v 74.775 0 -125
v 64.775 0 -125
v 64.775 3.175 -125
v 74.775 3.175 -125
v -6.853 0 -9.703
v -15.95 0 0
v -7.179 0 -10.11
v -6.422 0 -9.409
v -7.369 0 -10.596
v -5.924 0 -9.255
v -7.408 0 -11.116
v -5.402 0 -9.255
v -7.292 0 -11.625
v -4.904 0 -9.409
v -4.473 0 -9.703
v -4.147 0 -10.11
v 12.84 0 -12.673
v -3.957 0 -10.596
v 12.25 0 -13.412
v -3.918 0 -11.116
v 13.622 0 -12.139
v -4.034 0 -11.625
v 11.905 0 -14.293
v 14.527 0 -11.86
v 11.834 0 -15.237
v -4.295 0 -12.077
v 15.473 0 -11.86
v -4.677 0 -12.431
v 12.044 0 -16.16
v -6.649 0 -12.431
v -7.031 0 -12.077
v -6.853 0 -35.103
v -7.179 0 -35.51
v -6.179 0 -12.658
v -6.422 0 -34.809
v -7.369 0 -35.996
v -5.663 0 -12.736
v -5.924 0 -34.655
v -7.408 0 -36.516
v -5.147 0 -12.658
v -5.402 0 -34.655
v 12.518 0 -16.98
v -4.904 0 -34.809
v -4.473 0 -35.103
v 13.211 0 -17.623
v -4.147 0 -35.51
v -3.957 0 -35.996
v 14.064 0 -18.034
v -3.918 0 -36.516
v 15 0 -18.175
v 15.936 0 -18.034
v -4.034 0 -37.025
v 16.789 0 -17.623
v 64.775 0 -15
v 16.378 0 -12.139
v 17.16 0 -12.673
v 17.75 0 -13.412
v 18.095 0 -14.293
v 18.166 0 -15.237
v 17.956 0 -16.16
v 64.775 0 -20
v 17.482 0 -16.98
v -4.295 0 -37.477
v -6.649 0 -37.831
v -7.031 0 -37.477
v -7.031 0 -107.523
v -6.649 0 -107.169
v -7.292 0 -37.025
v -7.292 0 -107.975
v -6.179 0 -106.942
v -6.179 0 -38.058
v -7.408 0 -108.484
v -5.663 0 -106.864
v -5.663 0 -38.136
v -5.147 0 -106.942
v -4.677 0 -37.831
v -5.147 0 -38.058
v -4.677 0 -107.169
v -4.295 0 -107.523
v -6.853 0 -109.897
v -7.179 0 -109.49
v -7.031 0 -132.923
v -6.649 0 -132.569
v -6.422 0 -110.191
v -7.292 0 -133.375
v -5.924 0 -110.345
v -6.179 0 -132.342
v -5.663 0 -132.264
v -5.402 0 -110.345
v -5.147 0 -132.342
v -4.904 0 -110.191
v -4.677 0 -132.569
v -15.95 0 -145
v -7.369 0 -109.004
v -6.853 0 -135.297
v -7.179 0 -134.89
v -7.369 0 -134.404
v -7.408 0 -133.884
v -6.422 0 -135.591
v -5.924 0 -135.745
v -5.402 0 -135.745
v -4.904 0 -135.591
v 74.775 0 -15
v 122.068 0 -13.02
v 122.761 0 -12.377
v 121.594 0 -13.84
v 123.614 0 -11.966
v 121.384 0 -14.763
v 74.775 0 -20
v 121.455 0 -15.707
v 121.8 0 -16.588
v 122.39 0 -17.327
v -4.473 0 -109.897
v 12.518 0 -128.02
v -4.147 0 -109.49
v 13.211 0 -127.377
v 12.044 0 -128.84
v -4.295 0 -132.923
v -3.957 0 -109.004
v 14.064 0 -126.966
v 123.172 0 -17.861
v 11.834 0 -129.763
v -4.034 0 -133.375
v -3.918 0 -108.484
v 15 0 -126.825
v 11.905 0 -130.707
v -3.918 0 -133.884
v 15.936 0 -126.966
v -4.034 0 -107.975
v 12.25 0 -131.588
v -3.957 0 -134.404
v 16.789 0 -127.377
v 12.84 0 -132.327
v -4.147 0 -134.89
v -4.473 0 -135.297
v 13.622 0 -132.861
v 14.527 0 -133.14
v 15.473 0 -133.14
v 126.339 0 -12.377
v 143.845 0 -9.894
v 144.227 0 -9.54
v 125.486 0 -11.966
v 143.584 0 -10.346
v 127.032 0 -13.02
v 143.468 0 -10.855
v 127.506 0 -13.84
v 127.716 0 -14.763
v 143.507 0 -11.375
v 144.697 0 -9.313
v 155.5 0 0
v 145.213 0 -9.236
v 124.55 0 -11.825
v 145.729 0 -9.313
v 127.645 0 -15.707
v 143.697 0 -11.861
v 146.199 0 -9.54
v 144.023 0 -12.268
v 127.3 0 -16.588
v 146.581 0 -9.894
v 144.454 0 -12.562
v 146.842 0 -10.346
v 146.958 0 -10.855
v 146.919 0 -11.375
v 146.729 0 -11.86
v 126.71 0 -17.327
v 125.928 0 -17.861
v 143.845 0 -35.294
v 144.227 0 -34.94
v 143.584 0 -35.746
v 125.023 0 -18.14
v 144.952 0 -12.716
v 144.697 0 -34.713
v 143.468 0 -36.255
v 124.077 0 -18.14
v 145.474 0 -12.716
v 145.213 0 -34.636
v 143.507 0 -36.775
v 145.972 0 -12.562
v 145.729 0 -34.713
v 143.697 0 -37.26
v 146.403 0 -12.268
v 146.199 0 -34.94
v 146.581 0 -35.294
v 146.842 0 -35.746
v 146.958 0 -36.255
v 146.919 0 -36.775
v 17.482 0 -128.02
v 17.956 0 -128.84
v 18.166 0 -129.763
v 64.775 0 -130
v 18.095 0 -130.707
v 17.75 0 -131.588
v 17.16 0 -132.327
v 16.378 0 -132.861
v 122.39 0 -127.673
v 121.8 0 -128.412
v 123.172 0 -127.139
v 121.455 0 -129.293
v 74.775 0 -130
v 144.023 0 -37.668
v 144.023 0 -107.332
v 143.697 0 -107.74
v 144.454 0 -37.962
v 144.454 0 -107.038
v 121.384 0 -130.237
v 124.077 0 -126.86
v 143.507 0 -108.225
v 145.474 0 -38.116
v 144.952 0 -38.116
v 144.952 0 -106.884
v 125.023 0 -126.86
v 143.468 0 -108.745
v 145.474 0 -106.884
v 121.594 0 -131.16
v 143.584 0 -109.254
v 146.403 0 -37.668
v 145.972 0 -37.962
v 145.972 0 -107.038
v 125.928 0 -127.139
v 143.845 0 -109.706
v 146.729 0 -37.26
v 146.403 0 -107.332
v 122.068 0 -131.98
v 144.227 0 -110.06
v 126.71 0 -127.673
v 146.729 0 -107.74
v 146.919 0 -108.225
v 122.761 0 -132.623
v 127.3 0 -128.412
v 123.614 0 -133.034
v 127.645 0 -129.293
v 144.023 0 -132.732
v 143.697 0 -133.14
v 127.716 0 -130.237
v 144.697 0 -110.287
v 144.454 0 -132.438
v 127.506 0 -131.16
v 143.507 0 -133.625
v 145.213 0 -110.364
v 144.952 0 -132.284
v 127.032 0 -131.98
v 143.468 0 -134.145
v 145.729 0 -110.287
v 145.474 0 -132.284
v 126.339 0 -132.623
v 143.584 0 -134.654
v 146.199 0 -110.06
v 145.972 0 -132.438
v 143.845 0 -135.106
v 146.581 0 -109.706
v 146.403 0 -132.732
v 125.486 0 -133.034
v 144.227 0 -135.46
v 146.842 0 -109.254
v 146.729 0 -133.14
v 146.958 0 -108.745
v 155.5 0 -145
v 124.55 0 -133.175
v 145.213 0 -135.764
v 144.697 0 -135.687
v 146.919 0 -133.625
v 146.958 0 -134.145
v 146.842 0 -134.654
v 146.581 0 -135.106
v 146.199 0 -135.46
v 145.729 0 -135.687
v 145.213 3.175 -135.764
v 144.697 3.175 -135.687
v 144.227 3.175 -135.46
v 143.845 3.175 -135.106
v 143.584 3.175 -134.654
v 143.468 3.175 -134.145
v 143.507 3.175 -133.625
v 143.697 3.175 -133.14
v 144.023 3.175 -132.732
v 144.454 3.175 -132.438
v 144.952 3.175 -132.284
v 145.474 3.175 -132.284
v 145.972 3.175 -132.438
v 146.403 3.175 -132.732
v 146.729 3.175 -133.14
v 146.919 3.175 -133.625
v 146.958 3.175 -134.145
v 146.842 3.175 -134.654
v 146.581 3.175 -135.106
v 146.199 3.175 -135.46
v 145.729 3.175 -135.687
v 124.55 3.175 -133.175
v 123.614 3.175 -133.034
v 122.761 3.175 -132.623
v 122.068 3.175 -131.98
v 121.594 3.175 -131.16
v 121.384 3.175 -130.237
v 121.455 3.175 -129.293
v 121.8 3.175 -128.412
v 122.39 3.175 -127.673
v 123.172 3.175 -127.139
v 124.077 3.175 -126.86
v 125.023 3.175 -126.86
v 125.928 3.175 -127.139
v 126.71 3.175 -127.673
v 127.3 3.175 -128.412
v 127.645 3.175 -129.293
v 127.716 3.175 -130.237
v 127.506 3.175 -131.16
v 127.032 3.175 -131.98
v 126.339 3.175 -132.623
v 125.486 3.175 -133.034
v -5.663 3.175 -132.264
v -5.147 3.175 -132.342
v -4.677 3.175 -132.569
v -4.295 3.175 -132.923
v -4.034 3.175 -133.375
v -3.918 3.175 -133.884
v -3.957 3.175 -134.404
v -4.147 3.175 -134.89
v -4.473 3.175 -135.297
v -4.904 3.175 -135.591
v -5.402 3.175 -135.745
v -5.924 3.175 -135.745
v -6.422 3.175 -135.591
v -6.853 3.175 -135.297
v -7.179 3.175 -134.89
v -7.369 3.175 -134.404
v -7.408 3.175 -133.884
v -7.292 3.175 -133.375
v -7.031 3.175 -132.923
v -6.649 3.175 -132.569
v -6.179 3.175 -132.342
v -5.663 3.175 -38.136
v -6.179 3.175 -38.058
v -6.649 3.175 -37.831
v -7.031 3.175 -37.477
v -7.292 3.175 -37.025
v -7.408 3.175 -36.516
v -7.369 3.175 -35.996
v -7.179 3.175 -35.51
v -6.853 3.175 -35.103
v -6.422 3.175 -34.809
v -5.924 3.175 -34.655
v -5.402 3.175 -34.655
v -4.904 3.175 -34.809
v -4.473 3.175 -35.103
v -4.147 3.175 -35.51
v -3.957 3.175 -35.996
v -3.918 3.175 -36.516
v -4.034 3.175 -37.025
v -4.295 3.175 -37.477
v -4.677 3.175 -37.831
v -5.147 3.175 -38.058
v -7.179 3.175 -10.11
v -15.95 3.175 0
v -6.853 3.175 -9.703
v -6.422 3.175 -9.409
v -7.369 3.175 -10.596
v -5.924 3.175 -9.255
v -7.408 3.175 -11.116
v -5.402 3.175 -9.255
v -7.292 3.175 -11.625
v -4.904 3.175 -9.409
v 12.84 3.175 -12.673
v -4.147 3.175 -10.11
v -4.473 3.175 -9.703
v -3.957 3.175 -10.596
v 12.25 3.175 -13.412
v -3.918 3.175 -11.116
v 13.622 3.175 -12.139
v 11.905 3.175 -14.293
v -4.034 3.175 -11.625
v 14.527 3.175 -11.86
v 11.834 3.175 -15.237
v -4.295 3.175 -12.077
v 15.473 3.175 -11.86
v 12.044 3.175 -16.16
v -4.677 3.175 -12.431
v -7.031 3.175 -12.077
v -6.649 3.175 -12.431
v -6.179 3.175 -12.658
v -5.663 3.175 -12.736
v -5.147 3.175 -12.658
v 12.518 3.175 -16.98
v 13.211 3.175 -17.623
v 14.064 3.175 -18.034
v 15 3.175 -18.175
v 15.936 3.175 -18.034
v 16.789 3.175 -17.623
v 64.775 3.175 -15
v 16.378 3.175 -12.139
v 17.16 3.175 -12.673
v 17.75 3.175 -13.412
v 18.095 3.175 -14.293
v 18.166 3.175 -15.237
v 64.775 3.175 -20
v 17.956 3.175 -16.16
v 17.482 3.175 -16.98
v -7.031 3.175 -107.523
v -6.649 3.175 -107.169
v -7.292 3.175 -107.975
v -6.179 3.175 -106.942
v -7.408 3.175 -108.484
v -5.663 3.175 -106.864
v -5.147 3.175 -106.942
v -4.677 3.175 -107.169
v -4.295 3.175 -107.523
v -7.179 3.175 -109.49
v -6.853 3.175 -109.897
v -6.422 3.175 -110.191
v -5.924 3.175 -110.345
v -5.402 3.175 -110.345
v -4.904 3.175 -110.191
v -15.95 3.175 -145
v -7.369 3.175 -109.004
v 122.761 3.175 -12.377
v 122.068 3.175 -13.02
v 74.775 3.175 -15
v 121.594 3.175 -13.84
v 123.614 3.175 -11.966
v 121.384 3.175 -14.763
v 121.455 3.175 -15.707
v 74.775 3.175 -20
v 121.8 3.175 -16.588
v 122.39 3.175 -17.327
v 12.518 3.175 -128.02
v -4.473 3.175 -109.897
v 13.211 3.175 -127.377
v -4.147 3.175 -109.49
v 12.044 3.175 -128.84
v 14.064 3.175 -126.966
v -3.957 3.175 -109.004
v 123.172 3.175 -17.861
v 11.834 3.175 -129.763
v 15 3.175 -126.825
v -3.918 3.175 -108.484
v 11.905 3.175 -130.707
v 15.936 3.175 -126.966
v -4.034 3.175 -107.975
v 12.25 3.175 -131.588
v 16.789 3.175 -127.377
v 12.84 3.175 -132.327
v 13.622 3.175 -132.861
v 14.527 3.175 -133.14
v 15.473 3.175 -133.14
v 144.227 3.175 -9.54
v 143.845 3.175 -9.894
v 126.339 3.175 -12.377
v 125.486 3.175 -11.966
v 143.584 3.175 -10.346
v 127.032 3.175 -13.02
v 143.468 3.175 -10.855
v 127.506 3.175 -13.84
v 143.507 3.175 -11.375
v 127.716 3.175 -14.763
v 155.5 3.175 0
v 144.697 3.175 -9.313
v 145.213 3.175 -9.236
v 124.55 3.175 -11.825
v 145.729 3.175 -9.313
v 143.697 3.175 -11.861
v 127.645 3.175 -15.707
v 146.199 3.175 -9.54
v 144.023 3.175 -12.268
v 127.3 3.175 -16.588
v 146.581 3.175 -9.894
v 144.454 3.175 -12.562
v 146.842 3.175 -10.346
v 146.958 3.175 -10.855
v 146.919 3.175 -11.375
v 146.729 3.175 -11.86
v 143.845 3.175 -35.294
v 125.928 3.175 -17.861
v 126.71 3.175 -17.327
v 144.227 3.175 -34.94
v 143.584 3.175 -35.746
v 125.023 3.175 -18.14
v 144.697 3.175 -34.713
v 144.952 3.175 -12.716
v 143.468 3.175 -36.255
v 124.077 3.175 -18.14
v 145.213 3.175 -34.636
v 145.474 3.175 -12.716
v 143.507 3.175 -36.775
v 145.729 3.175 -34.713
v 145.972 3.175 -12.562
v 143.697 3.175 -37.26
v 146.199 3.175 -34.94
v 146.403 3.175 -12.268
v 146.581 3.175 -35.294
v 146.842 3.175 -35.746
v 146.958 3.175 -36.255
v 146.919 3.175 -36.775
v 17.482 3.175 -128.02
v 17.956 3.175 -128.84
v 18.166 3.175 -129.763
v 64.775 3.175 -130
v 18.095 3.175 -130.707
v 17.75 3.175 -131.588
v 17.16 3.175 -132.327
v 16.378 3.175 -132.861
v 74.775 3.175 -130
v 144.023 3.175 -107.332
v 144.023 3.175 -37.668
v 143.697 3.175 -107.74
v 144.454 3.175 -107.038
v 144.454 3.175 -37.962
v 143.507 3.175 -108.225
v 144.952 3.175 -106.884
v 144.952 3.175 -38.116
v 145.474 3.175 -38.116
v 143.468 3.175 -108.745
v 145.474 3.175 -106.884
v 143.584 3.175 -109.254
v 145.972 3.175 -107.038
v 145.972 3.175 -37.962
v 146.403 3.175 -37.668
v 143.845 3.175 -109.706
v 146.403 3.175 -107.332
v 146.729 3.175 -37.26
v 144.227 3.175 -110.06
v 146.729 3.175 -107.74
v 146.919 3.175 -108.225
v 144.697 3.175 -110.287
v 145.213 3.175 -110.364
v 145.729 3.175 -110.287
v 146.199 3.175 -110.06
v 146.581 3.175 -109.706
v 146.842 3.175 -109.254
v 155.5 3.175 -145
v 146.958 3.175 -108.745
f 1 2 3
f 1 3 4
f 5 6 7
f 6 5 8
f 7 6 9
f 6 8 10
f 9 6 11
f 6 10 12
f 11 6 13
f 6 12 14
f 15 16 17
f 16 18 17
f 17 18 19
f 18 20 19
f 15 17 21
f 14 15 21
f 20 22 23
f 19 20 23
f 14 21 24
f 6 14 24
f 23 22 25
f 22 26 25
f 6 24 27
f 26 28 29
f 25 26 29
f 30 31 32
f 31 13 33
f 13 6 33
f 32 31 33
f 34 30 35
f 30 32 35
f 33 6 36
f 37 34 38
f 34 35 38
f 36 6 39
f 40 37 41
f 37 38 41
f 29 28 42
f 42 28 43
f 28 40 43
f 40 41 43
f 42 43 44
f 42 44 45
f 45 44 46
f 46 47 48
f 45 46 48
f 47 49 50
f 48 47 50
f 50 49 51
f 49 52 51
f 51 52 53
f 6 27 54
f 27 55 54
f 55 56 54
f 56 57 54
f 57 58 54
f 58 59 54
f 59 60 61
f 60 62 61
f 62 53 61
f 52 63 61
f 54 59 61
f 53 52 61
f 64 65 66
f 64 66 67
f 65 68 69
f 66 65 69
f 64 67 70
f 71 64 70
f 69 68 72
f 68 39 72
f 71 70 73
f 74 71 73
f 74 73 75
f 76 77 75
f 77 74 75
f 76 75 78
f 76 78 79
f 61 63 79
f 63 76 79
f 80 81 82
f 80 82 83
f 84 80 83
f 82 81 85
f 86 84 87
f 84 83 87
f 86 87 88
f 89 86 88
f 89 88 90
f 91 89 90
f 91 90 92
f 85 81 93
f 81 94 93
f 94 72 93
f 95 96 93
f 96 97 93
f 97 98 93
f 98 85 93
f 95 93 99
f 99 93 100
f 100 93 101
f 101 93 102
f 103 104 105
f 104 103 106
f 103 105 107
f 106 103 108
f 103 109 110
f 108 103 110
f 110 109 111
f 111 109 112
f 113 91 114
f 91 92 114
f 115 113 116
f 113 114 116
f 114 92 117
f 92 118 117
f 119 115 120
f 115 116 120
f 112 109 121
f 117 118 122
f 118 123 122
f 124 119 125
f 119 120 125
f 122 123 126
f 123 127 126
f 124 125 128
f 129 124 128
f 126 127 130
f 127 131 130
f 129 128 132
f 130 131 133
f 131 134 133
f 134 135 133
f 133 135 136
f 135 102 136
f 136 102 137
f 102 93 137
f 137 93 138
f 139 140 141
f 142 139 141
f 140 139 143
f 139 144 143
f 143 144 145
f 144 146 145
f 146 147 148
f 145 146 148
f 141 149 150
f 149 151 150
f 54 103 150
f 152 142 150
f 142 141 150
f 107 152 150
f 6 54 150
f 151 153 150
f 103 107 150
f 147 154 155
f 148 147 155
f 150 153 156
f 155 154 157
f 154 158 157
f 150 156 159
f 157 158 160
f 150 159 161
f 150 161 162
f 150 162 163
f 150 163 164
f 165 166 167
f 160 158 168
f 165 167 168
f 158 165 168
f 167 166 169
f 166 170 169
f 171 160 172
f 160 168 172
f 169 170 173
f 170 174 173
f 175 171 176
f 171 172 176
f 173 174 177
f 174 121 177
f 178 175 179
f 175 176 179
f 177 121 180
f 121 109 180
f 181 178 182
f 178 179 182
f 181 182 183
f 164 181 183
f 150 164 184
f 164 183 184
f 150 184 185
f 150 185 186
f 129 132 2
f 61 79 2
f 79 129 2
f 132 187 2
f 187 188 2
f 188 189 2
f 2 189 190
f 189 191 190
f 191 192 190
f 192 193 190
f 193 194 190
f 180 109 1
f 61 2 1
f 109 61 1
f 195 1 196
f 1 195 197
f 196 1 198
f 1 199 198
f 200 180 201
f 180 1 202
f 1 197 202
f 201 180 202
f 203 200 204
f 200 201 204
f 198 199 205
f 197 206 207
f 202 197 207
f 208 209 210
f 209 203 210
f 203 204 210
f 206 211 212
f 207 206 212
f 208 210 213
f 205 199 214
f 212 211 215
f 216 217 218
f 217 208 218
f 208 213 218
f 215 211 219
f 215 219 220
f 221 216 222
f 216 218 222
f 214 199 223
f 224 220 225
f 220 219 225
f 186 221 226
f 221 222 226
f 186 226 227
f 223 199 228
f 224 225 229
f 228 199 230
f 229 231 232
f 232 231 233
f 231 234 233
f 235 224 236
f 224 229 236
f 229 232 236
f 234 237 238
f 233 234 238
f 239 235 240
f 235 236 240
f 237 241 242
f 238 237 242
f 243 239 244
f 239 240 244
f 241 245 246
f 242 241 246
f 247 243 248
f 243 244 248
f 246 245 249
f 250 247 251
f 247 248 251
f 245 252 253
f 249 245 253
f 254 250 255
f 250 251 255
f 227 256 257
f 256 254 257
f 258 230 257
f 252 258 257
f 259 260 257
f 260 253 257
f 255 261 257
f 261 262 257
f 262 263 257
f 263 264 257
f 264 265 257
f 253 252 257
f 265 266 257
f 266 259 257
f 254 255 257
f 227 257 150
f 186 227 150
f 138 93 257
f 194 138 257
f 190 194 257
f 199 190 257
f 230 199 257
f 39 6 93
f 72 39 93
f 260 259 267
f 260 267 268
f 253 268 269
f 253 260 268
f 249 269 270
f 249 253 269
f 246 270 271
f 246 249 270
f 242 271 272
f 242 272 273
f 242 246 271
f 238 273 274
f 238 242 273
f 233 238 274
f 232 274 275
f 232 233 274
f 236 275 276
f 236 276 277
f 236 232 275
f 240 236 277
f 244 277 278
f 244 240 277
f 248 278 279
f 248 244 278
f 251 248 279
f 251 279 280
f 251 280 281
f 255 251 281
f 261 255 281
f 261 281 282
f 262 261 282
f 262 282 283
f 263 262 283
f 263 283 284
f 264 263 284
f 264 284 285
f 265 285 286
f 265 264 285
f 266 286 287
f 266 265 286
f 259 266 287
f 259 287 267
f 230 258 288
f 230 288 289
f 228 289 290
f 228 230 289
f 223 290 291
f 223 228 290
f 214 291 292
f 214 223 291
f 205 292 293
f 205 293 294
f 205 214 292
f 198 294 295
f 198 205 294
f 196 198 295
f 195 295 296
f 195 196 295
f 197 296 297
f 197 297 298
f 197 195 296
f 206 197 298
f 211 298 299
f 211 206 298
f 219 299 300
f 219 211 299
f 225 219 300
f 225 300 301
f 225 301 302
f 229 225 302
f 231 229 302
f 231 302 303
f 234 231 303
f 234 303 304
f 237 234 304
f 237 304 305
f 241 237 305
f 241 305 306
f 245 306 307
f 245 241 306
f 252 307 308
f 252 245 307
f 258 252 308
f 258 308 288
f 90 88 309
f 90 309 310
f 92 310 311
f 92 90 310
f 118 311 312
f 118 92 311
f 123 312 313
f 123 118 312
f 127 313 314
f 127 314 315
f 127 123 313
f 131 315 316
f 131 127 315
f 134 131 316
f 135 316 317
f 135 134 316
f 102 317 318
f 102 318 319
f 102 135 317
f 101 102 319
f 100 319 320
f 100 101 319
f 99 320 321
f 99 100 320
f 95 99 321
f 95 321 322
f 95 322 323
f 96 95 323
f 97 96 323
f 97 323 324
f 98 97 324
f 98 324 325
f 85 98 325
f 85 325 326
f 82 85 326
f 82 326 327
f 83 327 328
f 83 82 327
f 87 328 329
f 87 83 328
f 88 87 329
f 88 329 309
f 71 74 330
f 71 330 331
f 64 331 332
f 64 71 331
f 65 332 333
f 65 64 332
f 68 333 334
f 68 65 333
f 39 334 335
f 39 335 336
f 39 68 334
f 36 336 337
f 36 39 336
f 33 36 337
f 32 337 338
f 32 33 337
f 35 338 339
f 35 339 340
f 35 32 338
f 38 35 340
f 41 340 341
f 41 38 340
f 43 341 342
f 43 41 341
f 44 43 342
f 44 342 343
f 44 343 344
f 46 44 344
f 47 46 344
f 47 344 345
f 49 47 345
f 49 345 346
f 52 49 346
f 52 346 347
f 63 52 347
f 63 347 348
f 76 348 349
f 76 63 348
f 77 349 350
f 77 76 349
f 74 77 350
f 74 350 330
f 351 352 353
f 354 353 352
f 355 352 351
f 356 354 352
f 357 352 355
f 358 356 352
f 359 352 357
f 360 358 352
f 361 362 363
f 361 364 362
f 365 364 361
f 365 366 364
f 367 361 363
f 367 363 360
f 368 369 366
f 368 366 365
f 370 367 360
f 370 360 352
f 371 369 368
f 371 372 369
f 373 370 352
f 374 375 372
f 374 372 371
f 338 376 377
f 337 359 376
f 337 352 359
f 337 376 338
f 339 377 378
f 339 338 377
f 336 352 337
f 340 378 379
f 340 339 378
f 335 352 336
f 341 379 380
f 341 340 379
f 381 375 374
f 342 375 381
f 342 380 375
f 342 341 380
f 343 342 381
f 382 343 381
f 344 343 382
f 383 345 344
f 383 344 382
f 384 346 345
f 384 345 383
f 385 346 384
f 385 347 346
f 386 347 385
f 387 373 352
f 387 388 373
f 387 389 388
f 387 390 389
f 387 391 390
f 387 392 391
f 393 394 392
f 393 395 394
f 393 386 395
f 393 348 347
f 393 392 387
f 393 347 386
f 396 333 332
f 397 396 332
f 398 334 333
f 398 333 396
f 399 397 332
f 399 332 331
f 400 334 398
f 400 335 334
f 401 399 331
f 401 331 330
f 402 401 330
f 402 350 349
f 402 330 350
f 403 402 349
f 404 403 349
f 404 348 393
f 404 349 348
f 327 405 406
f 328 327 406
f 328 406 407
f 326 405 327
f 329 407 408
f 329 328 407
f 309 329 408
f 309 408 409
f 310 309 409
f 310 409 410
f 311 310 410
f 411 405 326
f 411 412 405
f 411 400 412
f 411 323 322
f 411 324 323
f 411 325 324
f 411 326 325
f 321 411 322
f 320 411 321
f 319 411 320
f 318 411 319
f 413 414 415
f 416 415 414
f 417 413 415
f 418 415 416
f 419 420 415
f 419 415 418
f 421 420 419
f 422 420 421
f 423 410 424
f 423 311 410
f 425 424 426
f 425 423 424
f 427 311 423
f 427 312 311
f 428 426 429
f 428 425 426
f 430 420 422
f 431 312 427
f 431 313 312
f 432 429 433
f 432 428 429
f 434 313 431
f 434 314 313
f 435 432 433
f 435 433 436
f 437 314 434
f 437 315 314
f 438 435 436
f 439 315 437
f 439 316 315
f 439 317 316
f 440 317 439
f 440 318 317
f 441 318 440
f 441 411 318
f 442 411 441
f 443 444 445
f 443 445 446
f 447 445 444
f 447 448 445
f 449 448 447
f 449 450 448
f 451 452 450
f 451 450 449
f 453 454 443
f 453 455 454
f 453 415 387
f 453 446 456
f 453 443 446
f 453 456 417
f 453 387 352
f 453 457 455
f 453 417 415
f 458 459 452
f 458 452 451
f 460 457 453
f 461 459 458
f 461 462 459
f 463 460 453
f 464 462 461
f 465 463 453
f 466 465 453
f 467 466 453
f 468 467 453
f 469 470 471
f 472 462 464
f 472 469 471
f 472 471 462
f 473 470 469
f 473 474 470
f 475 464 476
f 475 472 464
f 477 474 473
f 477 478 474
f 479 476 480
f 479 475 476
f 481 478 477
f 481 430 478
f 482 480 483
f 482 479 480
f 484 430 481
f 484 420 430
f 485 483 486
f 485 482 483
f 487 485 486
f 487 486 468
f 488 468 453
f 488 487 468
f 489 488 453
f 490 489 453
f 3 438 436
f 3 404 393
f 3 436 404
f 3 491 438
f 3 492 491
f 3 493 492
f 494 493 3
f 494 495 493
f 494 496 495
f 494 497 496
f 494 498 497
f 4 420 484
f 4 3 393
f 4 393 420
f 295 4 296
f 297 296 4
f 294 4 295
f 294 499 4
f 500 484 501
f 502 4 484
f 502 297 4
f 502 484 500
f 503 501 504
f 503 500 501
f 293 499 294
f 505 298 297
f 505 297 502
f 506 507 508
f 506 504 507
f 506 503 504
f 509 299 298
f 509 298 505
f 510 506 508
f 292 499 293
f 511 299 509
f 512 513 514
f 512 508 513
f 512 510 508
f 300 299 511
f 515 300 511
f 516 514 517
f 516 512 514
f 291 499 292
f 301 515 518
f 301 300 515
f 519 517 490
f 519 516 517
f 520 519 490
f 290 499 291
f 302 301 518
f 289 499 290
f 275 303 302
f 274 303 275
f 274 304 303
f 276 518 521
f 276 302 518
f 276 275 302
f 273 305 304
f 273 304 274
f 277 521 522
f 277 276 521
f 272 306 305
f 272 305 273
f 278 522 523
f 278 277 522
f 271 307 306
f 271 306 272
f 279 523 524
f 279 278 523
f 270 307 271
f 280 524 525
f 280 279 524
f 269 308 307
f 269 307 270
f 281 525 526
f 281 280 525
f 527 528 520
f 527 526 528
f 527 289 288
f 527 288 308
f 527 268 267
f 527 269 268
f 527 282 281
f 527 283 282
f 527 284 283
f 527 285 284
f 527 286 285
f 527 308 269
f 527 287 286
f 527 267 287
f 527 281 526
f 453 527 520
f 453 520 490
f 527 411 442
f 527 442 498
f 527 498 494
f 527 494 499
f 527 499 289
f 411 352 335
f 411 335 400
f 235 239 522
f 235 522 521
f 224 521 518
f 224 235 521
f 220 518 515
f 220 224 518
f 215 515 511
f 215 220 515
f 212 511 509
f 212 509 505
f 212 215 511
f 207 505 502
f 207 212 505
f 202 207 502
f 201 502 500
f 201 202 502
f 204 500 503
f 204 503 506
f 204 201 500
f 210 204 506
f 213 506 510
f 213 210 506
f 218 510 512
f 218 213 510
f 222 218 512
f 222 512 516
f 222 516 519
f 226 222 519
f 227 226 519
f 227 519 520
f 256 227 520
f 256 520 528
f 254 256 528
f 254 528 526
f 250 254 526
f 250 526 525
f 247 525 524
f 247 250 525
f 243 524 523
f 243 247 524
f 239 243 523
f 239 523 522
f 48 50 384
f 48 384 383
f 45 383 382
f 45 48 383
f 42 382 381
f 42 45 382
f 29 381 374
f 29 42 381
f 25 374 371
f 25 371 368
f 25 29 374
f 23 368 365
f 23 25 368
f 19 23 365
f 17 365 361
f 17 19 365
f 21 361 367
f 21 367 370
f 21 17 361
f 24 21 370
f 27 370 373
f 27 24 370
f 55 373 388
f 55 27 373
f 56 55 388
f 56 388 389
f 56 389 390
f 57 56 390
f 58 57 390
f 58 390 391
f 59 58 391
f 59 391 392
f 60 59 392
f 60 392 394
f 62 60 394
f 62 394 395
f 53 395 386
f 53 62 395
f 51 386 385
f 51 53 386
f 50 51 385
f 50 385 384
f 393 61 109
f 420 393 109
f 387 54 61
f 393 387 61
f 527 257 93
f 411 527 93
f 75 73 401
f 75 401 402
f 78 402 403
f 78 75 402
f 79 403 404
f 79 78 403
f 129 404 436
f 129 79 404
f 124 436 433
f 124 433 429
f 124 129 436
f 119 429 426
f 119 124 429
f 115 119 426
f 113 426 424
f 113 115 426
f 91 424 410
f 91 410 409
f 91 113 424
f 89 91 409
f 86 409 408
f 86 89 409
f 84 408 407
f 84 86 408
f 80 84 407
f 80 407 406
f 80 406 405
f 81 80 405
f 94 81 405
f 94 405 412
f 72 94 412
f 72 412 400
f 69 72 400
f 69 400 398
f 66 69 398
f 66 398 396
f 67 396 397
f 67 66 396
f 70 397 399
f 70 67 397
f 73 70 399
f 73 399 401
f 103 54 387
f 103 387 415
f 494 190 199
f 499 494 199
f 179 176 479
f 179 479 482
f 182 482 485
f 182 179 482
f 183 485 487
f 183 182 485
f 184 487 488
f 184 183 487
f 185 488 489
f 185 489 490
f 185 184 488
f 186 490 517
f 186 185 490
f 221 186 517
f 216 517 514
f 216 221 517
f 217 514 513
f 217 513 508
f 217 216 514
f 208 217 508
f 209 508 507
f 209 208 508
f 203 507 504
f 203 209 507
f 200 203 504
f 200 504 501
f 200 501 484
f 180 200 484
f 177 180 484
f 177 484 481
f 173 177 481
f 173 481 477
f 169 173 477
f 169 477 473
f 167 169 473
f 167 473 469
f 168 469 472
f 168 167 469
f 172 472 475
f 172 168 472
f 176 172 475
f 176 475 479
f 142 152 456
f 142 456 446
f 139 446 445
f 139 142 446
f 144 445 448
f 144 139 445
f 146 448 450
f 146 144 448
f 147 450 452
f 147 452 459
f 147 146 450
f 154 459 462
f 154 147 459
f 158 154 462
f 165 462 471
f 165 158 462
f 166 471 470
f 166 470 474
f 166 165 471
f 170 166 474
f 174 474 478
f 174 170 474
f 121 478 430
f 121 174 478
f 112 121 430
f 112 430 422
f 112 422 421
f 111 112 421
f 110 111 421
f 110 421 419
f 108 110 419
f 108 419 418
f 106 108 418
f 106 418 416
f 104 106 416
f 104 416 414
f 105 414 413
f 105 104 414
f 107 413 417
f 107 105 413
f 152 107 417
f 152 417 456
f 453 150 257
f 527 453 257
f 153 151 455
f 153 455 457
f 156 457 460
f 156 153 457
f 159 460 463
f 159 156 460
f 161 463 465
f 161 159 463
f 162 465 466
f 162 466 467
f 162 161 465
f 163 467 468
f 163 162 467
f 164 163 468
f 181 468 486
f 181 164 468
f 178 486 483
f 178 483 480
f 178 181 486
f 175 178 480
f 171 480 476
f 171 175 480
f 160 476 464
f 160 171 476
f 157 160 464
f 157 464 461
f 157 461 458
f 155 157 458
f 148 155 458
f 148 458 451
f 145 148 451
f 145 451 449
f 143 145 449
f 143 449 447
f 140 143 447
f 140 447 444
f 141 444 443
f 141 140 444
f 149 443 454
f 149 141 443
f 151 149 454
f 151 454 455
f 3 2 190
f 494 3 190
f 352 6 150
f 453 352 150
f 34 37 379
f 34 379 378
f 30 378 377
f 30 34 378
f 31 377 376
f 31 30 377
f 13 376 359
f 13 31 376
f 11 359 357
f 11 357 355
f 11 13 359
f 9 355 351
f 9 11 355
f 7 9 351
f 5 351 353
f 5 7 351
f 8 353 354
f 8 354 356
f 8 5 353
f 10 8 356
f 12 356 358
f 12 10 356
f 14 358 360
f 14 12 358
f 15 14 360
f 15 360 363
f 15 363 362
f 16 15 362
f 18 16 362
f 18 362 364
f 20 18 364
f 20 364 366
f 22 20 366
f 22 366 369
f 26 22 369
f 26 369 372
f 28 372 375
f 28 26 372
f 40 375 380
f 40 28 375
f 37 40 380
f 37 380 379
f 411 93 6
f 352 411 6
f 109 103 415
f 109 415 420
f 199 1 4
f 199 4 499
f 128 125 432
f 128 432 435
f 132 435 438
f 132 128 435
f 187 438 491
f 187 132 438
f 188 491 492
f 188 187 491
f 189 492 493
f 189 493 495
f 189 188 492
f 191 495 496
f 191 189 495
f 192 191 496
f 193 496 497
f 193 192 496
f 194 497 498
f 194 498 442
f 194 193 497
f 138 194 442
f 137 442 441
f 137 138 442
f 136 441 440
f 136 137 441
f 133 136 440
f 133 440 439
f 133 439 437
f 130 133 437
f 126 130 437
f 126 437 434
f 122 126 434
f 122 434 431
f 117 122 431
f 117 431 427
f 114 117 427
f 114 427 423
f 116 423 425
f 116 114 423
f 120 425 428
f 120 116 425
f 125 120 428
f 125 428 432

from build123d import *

# Parameters (mm, degrees)
SKETCH1_R           = 3.175
SKETCH1_R_2         = 1.75
SKETCH1_W           = 10
SKETCH1_H           = 5
BOSS_EXTRUDE2_DEPTH = 3.175


with BuildPart() as part:
    # Sketch1 → Boss-Extrude2 (new body)
    with BuildSketch(Plane(origin=(0, 0, 0), x_dir=(1, 0, 0), z_dir=(0, 1, 0))):
        Polygon((0, 0), (139.55, 0), (155.5, 0), (155.5, 145), (139.55, 145), (0, 145), (-15.95, 145), (-15.95, 0), align=None)
        with Locations(Location((15, 130, 0), (0, 0, 270))):
            Circle(SKETCH1_R, mode=Mode.SUBTRACT)
        with Locations(Location((124.55, 130, 0), (0, 0, 90))):
            Circle(SKETCH1_R, mode=Mode.SUBTRACT)
        with Locations(Location((15, 15, 0), (0, 0, 90))):
            Circle(SKETCH1_R, mode=Mode.SUBTRACT)
        with Locations(Location((124.55, 15, 0), (0, 0, 270))):
            Circle(SKETCH1_R, mode=Mode.SUBTRACT)
        with Locations(Location((-5.663, 134.0145, 0), (0, 0, 270))):
            Circle(SKETCH1_R_2, mode=Mode.SUBTRACT)
        with Locations(Location((-5.663, 108.6145, 0), (0, 0, 270))):
            Circle(SKETCH1_R_2, mode=Mode.SUBTRACT)
        with Locations(Location((145.213, 134.0145, 0), (0, 0, 90))):
            Circle(SKETCH1_R_2, mode=Mode.SUBTRACT)
        with Locations(Location((145.213, 108.6145, 0), (0, 0, 90))):
            Circle(SKETCH1_R_2, mode=Mode.SUBTRACT)
        with Locations(Location((145.213, 10.9855, 0), (0, 0, 270))):
            Circle(SKETCH1_R_2, mode=Mode.SUBTRACT)
        with Locations(Location((-5.663, 10.9855, 0), (0, 0, 90))):
            Circle(SKETCH1_R_2, mode=Mode.SUBTRACT)
        with Locations(Location((145.213, 36.3855, 0), (0, 0, 270))):
            Circle(SKETCH1_R_2, mode=Mode.SUBTRACT)
        with Locations(Location((-5.663, 36.3855, 0), (0, 0, 90))):
            Circle(SKETCH1_R_2, mode=Mode.SUBTRACT)
        with Locations((69.775, 127.5)):
            Rectangle(SKETCH1_W, SKETCH1_H, mode=Mode.SUBTRACT)
        with Locations((69.775, 17.5)):
            Rectangle(SKETCH1_W, SKETCH1_H, mode=Mode.SUBTRACT)
    extrude(amount=BOSS_EXTRUDE2_DEPTH)


solid = part.part
